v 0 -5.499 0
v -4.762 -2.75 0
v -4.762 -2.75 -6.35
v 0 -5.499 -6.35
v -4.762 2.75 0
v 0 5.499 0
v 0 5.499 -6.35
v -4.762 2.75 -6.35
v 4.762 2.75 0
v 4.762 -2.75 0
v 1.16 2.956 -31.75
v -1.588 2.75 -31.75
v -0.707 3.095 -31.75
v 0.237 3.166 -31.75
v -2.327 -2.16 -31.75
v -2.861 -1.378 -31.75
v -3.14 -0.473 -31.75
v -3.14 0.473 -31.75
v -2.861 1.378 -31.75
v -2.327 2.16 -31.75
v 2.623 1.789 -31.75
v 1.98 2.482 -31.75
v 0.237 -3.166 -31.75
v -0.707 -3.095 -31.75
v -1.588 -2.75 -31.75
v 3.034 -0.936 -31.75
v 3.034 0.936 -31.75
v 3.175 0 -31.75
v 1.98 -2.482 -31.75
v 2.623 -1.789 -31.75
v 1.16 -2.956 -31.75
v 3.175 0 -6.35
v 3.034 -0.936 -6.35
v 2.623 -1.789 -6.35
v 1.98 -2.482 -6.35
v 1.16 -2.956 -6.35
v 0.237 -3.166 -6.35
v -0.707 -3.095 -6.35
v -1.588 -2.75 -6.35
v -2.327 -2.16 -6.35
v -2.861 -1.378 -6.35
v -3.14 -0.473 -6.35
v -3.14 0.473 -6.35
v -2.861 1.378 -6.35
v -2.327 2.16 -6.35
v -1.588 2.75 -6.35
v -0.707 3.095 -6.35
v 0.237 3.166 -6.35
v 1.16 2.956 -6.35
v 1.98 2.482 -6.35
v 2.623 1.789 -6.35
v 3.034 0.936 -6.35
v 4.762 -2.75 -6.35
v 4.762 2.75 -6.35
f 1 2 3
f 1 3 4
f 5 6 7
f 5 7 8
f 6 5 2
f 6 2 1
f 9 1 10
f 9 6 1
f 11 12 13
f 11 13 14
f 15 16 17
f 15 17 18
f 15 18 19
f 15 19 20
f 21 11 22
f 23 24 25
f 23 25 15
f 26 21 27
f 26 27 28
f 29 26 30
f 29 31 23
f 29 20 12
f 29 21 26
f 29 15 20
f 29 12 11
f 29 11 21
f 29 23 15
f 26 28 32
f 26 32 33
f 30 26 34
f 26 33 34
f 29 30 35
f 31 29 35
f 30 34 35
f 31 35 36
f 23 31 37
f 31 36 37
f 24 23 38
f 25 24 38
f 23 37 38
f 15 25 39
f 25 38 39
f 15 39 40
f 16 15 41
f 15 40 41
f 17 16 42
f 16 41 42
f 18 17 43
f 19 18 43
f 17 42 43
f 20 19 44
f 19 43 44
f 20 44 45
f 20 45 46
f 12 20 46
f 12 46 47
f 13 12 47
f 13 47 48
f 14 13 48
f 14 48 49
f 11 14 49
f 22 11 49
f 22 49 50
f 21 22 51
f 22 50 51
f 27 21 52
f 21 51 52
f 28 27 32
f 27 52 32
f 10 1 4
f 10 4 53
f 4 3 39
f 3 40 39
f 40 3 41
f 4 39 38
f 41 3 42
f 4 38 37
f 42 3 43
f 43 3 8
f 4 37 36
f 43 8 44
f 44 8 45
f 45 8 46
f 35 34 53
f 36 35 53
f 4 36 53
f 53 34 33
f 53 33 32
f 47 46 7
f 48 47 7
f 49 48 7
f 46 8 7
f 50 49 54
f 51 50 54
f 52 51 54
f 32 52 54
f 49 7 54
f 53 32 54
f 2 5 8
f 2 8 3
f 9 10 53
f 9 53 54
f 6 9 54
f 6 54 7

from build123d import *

# Parameters (mm, degrees)
PAD_DEPTH    = 6.35
SKETCH001_R  = 3.175
PAD001_DEPTH = 25.4


with BuildPart() as part:
    # Sketch → Pad (new body)
    with BuildSketch(Plane.XY):
        Polygon((4.7625, 2.749631), (0, 5.499261), (-4.7625, 2.749631), (-4.7625, -2.749631), (0, -5.499261), (4.7625, -2.749631), align=None)
    extrude(amount=-PAD_DEPTH)

    # Sketch001 (on Face8 of Pad) → Pad001 (join)
    with BuildSketch(Plane(origin=(0, 0, -6.35), x_dir=(1, 0, 0), z_dir=(0, 0, -1))):
        Circle(SKETCH001_R)
    extrude(amount=PAD001_DEPTH)


solid = part.part
